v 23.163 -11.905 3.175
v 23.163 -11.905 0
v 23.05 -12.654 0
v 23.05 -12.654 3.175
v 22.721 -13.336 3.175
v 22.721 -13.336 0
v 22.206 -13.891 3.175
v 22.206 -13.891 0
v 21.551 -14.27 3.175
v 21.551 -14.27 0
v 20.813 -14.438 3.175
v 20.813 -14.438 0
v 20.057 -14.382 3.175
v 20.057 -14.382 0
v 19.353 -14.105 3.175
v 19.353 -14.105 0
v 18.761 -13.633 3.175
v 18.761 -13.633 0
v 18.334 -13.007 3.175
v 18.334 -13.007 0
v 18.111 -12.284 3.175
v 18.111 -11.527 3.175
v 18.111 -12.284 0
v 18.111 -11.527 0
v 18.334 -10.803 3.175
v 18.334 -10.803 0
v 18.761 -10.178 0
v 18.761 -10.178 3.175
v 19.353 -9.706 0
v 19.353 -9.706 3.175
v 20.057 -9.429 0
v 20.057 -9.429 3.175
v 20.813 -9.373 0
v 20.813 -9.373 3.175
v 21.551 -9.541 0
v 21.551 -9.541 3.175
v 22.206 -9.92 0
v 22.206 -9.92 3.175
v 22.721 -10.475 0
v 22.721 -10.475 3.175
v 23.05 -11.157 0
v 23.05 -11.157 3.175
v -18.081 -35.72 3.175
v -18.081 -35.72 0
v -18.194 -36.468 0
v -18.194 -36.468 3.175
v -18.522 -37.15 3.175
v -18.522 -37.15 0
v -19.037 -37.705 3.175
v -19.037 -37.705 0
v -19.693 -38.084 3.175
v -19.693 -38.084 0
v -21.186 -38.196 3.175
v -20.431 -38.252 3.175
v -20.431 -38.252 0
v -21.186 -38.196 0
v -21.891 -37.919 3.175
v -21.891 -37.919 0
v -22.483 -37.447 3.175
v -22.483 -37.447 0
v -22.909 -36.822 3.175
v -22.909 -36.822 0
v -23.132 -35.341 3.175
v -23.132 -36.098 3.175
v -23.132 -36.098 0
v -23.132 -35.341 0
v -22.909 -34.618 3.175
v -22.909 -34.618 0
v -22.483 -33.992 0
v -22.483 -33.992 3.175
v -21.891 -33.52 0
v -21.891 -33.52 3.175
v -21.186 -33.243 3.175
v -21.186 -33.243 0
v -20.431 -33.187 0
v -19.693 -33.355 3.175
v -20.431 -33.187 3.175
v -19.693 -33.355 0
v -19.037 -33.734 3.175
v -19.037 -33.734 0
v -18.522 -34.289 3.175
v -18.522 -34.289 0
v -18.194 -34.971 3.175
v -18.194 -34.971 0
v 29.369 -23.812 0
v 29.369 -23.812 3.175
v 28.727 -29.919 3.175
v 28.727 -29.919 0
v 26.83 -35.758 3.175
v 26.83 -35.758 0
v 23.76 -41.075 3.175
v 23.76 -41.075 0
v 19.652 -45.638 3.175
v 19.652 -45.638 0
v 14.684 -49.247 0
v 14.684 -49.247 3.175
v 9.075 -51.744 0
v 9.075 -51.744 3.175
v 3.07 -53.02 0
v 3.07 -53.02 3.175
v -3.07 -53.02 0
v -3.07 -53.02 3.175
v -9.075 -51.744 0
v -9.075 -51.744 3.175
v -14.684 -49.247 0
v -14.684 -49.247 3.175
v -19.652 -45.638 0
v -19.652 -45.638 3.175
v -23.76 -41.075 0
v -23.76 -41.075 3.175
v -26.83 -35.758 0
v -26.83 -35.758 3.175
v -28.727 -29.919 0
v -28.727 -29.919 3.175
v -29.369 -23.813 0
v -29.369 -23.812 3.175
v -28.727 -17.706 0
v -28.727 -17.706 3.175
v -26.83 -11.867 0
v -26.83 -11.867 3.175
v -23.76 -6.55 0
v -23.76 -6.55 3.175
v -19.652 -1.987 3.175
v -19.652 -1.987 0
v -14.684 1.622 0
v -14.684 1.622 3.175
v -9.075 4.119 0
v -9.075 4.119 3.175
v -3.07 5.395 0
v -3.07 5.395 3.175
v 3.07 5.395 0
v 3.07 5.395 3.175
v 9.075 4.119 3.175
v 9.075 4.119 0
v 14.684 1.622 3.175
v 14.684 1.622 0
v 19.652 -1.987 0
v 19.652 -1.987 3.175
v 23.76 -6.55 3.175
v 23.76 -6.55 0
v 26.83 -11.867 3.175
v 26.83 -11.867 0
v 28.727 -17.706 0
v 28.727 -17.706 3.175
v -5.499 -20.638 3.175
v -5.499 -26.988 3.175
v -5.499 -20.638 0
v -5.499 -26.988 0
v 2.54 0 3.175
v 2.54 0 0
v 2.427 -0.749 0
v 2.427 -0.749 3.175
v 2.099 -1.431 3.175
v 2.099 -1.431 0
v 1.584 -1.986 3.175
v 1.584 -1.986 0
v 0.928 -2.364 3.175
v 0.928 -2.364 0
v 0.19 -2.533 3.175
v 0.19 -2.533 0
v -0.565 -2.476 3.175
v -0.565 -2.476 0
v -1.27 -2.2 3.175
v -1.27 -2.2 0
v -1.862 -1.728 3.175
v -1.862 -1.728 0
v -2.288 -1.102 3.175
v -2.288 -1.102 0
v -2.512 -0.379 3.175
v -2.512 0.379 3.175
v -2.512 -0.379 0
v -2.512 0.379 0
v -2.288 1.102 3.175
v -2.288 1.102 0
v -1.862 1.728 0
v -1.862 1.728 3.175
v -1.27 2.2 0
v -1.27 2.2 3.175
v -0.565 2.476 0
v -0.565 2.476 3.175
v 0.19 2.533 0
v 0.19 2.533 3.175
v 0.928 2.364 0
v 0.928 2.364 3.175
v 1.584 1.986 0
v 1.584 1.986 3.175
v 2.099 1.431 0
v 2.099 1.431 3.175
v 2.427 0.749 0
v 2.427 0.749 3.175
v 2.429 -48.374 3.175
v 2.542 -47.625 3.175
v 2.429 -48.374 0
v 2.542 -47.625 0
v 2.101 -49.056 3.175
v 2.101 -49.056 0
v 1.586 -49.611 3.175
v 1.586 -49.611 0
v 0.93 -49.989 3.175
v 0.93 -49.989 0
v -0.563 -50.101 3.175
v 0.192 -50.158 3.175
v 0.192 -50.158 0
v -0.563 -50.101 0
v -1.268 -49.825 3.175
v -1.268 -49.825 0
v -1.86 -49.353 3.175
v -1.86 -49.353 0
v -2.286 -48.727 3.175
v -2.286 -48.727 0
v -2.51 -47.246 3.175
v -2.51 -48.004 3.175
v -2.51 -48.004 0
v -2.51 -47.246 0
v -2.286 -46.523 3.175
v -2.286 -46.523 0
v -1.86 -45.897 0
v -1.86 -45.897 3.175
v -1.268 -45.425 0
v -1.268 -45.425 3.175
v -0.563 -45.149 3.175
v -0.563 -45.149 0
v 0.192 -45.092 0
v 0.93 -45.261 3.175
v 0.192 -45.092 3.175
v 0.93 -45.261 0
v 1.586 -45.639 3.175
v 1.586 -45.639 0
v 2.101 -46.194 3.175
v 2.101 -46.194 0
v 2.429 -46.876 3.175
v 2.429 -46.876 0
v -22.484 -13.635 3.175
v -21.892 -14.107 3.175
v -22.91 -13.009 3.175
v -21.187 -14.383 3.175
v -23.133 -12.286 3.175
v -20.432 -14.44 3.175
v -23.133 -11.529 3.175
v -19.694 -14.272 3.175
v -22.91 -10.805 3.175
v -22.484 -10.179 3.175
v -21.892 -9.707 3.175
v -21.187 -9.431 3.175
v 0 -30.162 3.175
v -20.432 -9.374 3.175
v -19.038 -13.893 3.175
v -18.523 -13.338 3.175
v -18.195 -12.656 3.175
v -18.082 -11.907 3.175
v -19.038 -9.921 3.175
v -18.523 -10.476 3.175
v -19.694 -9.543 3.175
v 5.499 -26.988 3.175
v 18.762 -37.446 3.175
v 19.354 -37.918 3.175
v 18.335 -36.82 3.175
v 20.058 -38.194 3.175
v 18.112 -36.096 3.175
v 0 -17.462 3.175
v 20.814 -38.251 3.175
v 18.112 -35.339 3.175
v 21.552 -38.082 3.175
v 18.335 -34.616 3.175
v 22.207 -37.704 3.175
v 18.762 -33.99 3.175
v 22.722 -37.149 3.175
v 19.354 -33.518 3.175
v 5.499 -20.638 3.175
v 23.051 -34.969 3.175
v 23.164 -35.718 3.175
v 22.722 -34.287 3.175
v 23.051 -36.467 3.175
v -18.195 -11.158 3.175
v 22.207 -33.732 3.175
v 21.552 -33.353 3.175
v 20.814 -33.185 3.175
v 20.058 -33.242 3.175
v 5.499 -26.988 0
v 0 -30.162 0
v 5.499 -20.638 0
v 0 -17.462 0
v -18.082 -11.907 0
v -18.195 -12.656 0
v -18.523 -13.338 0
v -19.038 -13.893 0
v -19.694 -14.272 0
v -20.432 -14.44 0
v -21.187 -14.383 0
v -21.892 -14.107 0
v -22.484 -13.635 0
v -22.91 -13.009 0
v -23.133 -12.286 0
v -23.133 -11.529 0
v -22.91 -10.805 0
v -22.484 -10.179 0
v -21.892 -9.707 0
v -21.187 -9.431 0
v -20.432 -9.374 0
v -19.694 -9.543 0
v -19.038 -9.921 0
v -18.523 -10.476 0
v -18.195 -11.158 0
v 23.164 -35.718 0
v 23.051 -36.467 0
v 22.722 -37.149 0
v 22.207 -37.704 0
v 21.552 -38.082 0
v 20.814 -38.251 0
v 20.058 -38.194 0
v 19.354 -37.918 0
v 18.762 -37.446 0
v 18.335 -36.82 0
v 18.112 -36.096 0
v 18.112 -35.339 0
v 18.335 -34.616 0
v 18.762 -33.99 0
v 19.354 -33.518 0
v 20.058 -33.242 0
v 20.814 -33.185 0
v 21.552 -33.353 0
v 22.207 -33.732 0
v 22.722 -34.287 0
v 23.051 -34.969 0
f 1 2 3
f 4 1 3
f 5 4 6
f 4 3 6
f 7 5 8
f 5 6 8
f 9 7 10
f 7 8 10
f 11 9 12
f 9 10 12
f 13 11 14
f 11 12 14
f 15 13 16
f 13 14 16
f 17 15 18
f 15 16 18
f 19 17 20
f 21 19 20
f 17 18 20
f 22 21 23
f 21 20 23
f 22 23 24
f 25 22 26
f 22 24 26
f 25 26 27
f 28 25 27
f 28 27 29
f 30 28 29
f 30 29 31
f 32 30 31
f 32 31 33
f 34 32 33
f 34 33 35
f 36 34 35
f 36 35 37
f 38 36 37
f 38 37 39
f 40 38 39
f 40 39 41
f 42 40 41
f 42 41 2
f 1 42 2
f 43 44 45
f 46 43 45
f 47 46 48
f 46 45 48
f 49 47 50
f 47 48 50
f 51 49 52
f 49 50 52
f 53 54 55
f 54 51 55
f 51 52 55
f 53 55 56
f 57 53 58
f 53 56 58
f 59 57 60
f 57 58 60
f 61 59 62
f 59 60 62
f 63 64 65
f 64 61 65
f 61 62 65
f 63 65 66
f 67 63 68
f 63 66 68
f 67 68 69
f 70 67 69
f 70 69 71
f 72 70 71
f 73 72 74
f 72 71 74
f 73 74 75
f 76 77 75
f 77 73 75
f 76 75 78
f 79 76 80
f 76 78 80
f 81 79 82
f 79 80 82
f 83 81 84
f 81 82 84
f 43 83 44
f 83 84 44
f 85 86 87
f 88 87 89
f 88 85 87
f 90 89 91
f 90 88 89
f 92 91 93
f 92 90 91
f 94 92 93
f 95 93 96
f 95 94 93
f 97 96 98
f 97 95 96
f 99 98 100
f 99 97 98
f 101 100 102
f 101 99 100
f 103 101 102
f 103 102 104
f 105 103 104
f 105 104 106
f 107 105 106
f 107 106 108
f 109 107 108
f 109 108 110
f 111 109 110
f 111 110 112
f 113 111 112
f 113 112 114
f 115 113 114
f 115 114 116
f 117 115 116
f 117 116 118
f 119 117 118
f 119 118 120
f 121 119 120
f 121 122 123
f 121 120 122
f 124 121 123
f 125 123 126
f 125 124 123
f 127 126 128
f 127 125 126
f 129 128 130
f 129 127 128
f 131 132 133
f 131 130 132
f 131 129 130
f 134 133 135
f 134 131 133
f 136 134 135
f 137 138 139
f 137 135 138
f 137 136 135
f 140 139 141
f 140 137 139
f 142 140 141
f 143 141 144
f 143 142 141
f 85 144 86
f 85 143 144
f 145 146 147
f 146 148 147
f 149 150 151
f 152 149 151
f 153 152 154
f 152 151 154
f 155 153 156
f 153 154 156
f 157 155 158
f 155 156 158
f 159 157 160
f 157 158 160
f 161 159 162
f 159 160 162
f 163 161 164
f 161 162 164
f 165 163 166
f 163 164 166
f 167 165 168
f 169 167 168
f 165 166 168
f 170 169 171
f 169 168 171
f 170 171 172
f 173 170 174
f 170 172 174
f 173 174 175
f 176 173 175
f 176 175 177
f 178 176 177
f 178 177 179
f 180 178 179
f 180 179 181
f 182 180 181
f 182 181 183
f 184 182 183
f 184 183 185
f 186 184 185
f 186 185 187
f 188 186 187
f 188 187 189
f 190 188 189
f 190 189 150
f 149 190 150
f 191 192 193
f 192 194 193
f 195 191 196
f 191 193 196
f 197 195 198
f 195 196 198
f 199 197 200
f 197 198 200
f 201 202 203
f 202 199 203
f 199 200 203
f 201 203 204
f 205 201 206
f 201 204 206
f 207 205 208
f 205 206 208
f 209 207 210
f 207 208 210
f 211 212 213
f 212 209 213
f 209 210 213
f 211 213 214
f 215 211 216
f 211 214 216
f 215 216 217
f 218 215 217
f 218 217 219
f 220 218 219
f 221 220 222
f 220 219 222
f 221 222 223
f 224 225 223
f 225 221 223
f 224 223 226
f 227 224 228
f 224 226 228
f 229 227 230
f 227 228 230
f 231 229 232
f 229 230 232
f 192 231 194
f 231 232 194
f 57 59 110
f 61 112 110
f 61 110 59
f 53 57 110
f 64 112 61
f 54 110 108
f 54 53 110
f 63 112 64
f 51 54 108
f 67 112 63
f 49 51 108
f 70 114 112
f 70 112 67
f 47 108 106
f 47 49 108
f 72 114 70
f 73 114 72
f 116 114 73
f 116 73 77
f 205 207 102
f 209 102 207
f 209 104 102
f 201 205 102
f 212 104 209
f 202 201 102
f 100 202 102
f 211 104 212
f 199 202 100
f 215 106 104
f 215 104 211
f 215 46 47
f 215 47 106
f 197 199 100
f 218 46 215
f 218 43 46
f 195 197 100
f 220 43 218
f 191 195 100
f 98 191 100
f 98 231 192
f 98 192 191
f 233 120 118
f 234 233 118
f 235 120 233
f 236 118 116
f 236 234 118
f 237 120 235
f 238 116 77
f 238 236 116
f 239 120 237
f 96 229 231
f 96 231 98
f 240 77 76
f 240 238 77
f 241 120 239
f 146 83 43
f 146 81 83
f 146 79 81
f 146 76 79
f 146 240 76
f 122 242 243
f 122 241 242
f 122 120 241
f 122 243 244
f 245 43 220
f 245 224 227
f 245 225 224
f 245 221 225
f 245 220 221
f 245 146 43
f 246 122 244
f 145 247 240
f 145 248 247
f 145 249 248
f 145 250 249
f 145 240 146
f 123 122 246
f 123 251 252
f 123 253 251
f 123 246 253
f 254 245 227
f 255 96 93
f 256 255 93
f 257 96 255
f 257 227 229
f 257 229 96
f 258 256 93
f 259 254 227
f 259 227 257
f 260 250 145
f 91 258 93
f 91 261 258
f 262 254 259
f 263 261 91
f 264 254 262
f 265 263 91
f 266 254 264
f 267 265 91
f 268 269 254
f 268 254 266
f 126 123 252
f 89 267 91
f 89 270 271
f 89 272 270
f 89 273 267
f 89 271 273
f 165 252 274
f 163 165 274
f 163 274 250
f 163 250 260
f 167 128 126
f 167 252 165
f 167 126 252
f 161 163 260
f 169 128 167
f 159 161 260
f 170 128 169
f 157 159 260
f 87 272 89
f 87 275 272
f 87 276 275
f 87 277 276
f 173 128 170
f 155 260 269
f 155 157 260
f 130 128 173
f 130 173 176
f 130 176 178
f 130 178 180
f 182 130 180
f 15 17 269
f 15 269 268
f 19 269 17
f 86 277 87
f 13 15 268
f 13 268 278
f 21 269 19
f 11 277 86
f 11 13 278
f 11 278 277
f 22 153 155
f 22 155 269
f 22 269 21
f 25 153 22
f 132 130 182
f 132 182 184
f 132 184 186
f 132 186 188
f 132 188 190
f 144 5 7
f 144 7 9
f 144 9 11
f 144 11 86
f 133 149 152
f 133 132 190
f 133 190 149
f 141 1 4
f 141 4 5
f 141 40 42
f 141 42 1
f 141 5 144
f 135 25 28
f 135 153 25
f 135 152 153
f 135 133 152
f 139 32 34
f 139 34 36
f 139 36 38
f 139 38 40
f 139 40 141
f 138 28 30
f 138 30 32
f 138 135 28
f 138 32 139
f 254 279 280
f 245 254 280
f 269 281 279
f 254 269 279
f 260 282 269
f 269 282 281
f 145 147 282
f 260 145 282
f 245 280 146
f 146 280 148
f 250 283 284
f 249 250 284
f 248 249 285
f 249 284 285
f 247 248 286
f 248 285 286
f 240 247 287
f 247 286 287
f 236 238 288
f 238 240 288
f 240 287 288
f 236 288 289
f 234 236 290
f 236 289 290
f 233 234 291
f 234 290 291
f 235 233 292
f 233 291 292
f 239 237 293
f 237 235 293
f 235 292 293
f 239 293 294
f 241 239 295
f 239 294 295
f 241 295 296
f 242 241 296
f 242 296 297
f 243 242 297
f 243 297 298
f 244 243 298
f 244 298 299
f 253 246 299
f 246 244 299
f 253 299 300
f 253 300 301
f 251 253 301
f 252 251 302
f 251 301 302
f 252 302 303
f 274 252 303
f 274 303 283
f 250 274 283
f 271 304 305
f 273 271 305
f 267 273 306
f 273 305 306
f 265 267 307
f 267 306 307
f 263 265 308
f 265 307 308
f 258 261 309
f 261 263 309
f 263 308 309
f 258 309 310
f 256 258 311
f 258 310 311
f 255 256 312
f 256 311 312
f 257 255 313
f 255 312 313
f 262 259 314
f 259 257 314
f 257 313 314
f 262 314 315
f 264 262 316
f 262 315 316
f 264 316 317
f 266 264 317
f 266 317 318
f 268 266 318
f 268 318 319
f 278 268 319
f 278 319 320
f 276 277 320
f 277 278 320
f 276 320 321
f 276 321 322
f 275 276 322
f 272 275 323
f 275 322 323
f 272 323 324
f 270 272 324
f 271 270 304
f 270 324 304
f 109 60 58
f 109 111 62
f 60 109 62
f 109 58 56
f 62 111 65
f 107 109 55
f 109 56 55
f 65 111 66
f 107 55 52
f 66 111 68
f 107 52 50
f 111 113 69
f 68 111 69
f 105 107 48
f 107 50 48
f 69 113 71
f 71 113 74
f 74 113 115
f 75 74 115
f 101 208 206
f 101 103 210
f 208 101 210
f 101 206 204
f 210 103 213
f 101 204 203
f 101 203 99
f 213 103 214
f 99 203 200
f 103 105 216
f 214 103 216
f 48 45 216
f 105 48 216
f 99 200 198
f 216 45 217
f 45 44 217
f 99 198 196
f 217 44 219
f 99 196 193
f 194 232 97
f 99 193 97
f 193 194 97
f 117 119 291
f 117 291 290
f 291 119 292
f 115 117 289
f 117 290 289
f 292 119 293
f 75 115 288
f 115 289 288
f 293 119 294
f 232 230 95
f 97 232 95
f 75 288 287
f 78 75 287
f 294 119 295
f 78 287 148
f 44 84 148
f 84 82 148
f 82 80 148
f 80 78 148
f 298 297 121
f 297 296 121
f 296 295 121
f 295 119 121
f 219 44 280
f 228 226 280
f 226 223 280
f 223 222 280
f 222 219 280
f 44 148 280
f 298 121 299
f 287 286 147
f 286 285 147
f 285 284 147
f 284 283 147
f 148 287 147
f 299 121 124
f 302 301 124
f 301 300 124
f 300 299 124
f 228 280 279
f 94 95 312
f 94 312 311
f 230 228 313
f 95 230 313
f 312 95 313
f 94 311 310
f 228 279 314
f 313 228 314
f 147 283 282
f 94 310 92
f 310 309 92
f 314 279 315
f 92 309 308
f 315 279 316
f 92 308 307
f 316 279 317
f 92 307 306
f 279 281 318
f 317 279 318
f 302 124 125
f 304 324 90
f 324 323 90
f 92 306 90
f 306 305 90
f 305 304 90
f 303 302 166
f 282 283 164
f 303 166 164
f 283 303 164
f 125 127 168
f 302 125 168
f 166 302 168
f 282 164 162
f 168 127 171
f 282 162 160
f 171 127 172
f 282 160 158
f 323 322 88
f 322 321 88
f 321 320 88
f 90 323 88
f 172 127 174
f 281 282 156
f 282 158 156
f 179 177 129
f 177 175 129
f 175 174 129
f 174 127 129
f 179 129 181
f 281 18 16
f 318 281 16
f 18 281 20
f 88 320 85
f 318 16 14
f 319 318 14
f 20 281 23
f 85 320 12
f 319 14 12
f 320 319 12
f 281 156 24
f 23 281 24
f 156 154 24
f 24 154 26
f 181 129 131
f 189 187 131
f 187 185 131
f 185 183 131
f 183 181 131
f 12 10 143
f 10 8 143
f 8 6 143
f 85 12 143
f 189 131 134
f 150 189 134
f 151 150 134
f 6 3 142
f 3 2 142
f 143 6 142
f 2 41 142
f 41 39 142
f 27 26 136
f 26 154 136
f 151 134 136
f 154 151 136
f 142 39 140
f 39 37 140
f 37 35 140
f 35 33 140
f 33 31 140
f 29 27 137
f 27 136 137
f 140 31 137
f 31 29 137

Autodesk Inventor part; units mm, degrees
ref_plane "YZ Plane" through (0, 0, 0) normal (1, 0, 0) x (0, 1, 0)
ref_plane "XZ Plane" through (0, 0, 0) normal (0, 1, 0) x (-1, 0, 0)
ref_plane "XY Plane" through (0, 0, 0) normal (0, 0, 1) x (1, 0, 0)
sketch "Sketch1" plane through (0, 0, 0) normal (0, 0, 1) x (1, 0, 0)
  arc A0 (24.3719, -16.0061) -> (18.9457, -6.6082) centre (20.6227, -11.9054) ccw
  arc A1 (18.9457, -6.6082) -> (15.375, -3.3543) centre (0, -23.8125) ccw
  arc A2 (15.4859, -6.1082) -> (15.375, -3.3543) centre (14.3062, -4.7765) ccw
  arc A3 (15.4859, -6.1082) -> (13.3187, -9.3259) centre (20.6222, -11.9062) ccw
  arc A4 (10.5541, -10.1415) -> (13.3187, -9.3259) centre (11.6413, -8.7333) ccw
  arc A5 (10.5541, -10.1415) -> (6.5626, -7.8369) centre (0, -23.8125) ccw
  arc A6 (5.8865, -5.0351) -> (6.5626, -7.8369) centre (7.2386, -6.1913) ccw
  arc A7 (5.8865, -5.0351) -> (7.5891, -1.5492) centre (-0.0005, -0.0009) ccw
  arc A8 (10.0295, -0.2681) -> (7.5891, -1.5492) centre (9.3323, -1.9049) ccw
  arc A9 (10.0295, -0.2681) -> (5.4257, 1.1973) centre (0, -23.8125) ccw
  arc A10 (5.4257, 1.1973) -> (-5.4257, 1.1973) centre (0, 0) ccw
  arc A11 (-5.4257, 1.1973) -> (-10.0298, -0.2683) centre (0, -23.8125) ccw
  arc A12 (-7.5894, -1.5492) -> (-10.0298, -0.2683) centre (-9.3326, -1.905) ccw
  arc A13 (-7.5894, -1.5492) -> (-5.8864, -5.0349) centre (0, 0) ccw
  arc A14 (-6.5624, -7.8369) -> (-5.8864, -5.0349) centre (-7.2384, -6.1912) ccw
  arc A15 (-6.5624, -7.8369) -> (-10.554, -10.1414) centre (0, -23.8125) ccw
  arc A16 (-13.3185, -9.326) -> (-10.554, -10.1414) centre (-11.6411, -8.7331) ccw
  arc A17 (-13.3185, -9.326) -> (-15.486, -6.1085) centre (-20.6217, -11.9071) ccw
  arc A18 (-15.3753, -3.3545) -> (-15.486, -6.1085) centre (-14.3064, -4.7767) ccw
  arc A19 (-15.3753, -3.3545) -> (-18.9467, -6.6093) centre (0, -23.8125) ccw
  arc A20 (-18.9467, -6.6093) -> (-24.3721, -16.0067) centre (-20.6217, -11.9071) ccw
  arc A21 (-24.3721, -16.0067) -> (-25.4048, -20.7264) centre (0, -23.8125) ccw
  arc A22 (-23.0753, -19.2535) -> (-25.4048, -20.7264) centre (-23.6387, -20.941) ccw
  arc A23 (-23.0753, -19.2535) -> (-19.2051, -19.5215) centre (-20.6222, -11.9063) ccw
  arc A24 (-17.1165, -21.5079) -> (-19.2051, -19.5215) centre (-18.8796, -21.2705) ccw
  arc A25 (-17.1165, -21.5079) -> (-17.1165, -26.1169) centre (0, -23.8125) ccw
  arc A26 (-19.2049, -28.1034) -> (-17.1165, -26.1169) centre (-18.8797, -26.3543) ccw
  arc A27 (-19.2049, -28.1034) -> (-23.0751, -28.3718) centre (-20.6212, -35.7187) ccw
  arc A28 (-25.4048, -26.8989) -> (-23.0751, -28.3718) centre (-23.6387, -26.6843) ccw
  arc A29 (-25.4048, -26.8989) -> (-24.3714, -31.6203) centre (0, -23.8125) ccw
  arc A30 (-24.3714, -31.6203) -> (-18.9453, -41.0172) centre (-20.6207, -35.7196) ccw
  arc A31 (-18.9453, -41.0172) -> (-15.375, -44.2707) centre (0, -23.8125) ccw
  arc A32 (-15.4859, -41.5168) -> (-15.375, -44.2707) centre (-14.3062, -42.8485) ccw
  arc A33 (-15.4859, -41.5168) -> (-13.3187, -38.2991) centre (-20.6222, -35.7188) ccw
  arc A34 (-10.5541, -37.4835) -> (-13.3187, -38.2991) centre (-11.6413, -38.8917) ccw
  arc A35 (-10.5541, -37.4835) -> (-6.5626, -39.7881) centre (0, -23.8125) ccw
  arc A36 (-5.8865, -42.5899) -> (-6.5626, -39.7881) centre (-7.2386, -41.4337) ccw
  arc A37 (-5.8865, -42.5899) -> (-7.5891, -46.0758) centre (0.0005, -47.6241) ccw
  arc A38 (-10.0295, -47.3569) -> (-7.5891, -46.0758) centre (-9.3323, -45.7201) ccw
  arc A39 (-10.0295, -47.3569) -> (-5.4236, -48.8227) centre (0, -23.8125) ccw
  arc A40 (-5.4236, -48.8227) -> (5.4278, -48.8218) centre (0.002, -47.625) ccw
  arc A41 (5.4278, -48.8218) -> (10.0298, -47.3567) centre (0, -23.8125) ccw
  arc A42 (7.5894, -46.0758) -> (10.0298, -47.3567) centre (9.3326, -45.72) ccw
  arc A43 (7.5894, -46.0758) -> (5.8864, -42.5901) centre (0, -47.625) ccw
  arc A44 (6.5624, -39.7881) -> (5.8864, -42.5901) centre (7.2384, -41.4338) ccw
  arc A45 (6.5624, -39.7881) -> (10.554, -37.4836) centre (0, -23.8125) ccw
  arc A46 (13.3185, -38.299) -> (10.554, -37.4836) centre (11.6411, -38.8919) ccw
  arc A47 (13.3185, -38.299) -> (15.486, -41.5165) centre (20.6217, -35.7179) ccw
  arc A48 (15.3753, -44.2705) -> (15.486, -41.5165) centre (14.3064, -42.8483) ccw
  arc A49 (15.3753, -44.2705) -> (18.9472, -41.0152) centre (0, -23.8125) ccw
  arc A50 (18.9472, -41.0152) -> (24.3725, -31.6169) centre (20.6237, -35.7179) ccw
  arc A51 (24.3725, -31.6169) -> (25.4048, -26.8986) centre (0, -23.8125) ccw
  arc A52 (23.0753, -28.3715) -> (25.4048, -26.8986) centre (23.6387, -26.684) ccw
  arc A53 (23.0753, -28.3715) -> (19.2051, -28.1035) centre (20.6222, -35.7187) ccw
  arc A54 (17.1165, -26.1171) -> (19.2051, -28.1035) centre (18.8796, -26.3545) ccw
  arc A55 (17.1165, -26.1171) -> (17.1165, -21.5081) centre (0, -23.8125) ccw
  arc A56 (19.2049, -19.5216) -> (17.1165, -21.5081) centre (18.8797, -21.2707) ccw
  arc A57 (19.2049, -19.5216) -> (23.0751, -19.2532) centre (20.6212, -11.9063) ccw
  arc A58 (25.4048, -20.7261) -> (23.0751, -19.2532) centre (23.6387, -20.9407) ccw
  arc A59 (25.4048, -20.7261) -> (24.3719, -16.0061) centre (0, -23.8125) ccw
  circle A60 centre (20.6227, -11.9054) radius 2.54
  circle A61 centre (20.6237, -35.7179) radius 2.54
  circle A62 centre (0.002, -47.625) radius 2.54
  circle A63 centre (-20.6207, -35.7196) radius 2.54
  circle A64 centre (-20.6217, -11.9071) radius 2.54
  circle A65 centre (0, 0) radius 2.54
  circle A66 centre (0, -23.8125) radius 14.2875
  circle A67 centre (0, -23.8125) radius 29.3688
  circle A68 centre (0, -23.8125) radius 6.35
  line L0 (0, 0) -> (0, -17.4625)
  line L1 (20.6227, -11.9054) -> (5.4278, -20.5169)
  line L2 (0, -17.4625) -> (5.4993, -20.6375)
  line L3 (5.4993, -20.6375) -> (5.4993, -26.9875)
  line L4 (5.4993, -26.9875) -> (0, -30.1625)
  line L5 (0, -30.1625) -> (-5.4993, -26.9875)
  line L6 (-5.4993, -26.9875) -> (-5.4993, -20.6375)
  line L7 (-5.4993, -20.6375) -> (0, -17.4625)
  dimension "d0" = 12.7
extrude "Extrusion1" add sketch "Sketch1" along normal blind 3.175 contours A59 A58 A57 A56 A55 A54 A53 A52 A51 A50 A49 A48 A47 A46 A45 A44 A43 A42 A41 A40 A39 A38 A37 A36 A35 A34 A33 A32 A31 A30 A29 A28 A27 A26 A25 A24 A23 A22 A21 A20 A19 A18 A17 A16 A15 A14 A13 A12 A11 A10 A9 A8 A7 A6 A5 A4 A3 A2 A1 A0 | A0 A67 A50 A51 A52 A53 A54 A55 A56 A57 A58 A59 | A0 A1 A2 A3 A4 A5 A6 A7 A8 A9 A10 A67 | A10 A11 A12 A13 A14 A15 A16 A17 A18 A19 A20 A67 | A67 A40 A41 A42 A43 A44 A45 A46 A47 A48 A49 A50 | A20 A21 A22 A23 A24 A25 A26 A27 A28 A29 A30 A67 | A67 A30 A31 A32 A33 A34 A35 A36 A37 A38 A39 A40 | A66 L0 A68 L1 | L1 A68 L0 A66 | A68 L2 | L7 A68 | A68 L3 | L6 A68 | A68 L4 | L5 A68
properties part number "wheelhubthing" material "Aluminum 6061"
